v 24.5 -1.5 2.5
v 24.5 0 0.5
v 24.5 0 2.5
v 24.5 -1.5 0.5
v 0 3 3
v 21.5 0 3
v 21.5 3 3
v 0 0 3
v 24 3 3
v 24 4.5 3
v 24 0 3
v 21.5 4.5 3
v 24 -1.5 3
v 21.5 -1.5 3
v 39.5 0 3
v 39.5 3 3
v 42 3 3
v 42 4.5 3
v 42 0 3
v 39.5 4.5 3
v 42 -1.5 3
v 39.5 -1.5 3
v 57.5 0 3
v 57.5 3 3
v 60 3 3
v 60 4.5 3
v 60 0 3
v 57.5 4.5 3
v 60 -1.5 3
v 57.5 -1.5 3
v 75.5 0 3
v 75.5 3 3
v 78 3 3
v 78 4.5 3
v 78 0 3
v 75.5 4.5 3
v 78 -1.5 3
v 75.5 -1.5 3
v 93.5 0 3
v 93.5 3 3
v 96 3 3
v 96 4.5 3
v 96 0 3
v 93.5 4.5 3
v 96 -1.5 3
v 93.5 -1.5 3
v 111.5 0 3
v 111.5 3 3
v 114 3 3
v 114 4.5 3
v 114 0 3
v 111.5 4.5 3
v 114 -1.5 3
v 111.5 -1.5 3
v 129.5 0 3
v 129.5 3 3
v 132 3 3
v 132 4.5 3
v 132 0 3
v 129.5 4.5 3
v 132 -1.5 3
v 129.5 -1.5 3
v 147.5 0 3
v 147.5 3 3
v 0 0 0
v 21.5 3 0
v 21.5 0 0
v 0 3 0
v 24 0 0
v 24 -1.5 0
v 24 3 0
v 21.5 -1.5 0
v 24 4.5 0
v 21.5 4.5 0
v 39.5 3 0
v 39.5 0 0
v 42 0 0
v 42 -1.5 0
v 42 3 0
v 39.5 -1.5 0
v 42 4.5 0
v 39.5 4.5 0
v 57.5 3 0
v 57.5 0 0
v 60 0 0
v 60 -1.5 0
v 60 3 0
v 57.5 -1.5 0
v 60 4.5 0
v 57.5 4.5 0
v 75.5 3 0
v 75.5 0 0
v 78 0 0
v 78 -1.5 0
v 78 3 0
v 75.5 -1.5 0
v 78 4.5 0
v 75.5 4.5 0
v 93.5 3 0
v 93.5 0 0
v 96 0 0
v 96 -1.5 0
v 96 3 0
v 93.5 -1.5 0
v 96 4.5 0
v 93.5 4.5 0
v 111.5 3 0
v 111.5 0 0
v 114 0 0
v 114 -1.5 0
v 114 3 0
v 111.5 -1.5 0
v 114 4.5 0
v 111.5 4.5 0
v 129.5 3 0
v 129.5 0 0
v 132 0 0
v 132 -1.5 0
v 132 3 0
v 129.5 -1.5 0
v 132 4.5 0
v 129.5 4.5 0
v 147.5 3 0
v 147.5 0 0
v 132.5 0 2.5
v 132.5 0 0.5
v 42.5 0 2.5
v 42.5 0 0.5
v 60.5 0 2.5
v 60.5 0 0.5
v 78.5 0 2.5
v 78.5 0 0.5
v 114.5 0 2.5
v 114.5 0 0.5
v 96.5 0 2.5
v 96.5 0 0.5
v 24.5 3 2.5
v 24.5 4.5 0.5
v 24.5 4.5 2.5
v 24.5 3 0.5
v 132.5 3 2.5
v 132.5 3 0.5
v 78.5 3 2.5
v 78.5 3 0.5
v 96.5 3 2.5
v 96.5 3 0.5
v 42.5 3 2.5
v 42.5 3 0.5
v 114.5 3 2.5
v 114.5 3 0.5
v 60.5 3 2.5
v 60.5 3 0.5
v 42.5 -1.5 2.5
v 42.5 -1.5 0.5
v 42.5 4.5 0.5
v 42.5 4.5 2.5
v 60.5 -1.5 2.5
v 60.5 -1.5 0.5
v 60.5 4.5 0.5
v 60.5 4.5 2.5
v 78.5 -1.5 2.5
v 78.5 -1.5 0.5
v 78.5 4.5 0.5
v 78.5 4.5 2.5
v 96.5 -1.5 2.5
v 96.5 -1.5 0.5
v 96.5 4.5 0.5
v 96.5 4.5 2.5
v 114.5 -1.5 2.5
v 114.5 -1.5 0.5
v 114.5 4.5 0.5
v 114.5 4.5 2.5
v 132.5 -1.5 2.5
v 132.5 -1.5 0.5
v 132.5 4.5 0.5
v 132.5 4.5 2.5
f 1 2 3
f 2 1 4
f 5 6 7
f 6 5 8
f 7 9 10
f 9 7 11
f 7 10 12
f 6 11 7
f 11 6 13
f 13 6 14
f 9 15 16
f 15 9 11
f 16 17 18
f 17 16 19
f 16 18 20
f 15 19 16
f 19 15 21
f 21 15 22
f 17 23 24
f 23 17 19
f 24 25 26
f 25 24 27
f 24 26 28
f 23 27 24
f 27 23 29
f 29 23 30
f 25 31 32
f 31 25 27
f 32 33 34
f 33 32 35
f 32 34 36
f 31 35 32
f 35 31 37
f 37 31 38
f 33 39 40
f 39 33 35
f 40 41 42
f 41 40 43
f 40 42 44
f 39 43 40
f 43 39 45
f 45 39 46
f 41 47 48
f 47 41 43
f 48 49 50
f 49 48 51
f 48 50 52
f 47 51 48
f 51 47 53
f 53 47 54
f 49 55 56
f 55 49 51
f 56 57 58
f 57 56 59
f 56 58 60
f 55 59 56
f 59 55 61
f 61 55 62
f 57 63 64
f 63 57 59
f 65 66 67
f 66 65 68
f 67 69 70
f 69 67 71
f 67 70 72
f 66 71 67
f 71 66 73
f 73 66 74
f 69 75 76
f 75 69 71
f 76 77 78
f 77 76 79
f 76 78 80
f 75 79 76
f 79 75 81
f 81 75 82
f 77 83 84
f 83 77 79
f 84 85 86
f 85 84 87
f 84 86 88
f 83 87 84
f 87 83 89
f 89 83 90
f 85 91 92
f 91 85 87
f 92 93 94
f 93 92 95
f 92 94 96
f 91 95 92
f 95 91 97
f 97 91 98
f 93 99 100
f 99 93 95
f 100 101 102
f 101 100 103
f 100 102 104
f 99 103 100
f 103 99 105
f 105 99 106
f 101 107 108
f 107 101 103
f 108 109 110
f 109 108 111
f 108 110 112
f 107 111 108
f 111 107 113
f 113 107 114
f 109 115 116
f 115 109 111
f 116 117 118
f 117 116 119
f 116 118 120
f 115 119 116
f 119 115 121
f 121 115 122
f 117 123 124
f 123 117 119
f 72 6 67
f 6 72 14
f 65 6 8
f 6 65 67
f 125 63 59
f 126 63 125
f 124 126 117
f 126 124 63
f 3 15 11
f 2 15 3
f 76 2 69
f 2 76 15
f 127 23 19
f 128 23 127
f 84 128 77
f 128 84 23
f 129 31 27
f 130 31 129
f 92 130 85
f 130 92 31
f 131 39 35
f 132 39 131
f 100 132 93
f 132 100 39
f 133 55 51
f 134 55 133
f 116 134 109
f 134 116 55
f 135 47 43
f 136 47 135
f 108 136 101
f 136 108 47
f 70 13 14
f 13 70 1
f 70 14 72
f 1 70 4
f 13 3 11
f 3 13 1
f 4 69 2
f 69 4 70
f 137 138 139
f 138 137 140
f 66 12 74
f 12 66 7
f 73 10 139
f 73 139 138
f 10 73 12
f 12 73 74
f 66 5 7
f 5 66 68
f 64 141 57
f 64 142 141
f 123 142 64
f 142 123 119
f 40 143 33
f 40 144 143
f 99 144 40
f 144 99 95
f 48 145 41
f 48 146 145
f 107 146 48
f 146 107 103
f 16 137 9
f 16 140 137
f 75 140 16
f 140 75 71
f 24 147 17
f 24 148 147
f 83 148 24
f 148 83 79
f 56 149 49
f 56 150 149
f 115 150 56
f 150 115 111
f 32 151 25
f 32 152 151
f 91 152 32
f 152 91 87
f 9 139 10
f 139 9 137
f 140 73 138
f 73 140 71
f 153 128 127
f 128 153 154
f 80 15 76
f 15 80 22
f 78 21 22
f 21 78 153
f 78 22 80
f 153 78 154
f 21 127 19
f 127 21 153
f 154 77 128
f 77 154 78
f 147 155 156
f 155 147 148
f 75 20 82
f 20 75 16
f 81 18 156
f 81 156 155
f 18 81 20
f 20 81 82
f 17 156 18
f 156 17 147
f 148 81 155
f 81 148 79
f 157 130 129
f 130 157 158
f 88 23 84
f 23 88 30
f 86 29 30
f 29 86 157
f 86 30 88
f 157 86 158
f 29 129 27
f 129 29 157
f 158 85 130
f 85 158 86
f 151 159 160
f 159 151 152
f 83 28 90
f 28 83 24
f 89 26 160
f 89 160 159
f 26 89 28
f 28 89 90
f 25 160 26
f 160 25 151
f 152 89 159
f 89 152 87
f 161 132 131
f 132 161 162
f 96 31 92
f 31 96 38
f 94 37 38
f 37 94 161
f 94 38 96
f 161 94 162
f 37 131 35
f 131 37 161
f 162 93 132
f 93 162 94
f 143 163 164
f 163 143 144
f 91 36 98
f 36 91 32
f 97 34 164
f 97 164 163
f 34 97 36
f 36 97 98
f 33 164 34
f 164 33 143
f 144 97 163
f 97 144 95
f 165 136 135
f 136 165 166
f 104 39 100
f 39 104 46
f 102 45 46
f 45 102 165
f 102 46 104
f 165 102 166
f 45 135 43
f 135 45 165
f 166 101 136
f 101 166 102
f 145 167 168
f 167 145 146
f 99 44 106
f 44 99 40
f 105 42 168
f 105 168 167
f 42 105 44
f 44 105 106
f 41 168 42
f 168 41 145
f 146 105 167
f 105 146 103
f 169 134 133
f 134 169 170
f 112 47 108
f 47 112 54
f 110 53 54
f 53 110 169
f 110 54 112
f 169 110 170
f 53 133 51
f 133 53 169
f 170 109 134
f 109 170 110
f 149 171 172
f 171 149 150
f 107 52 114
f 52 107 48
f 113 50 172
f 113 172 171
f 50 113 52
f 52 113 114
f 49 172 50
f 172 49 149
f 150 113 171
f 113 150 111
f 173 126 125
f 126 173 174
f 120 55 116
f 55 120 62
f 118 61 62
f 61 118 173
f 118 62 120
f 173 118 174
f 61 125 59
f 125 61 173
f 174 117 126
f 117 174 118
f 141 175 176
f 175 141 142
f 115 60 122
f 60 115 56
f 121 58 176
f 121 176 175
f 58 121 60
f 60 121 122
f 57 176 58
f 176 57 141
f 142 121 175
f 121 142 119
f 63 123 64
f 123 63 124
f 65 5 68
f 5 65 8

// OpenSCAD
size = 7;
space = 15;
stick_size = 3;
hole_size = stick_size + 0.15;
gap_size = 5;

$fn=100;

module base(){
    difference(){
        cube([(space+hole_size)*size-space+hole_size*2, (space+hole_size)*size-space+hole_size*2, 10]);

        for (i=[0:size]){
            for (j=[0:size]){
                translate([i*(space+hole_size)+hole_size,j*(space+hole_size)+hole_size,2]) cube([hole_size,hole_size,10]);
            }
        }
    }
}

module stick() {
    cube([8+(space+stick_size)*(size+1)-stick_size*1.5,stick_size,stick_size]);
    for (i=[1:size]){
        translate([8+(space+stick_size)*i-stick_size*1.5,-stick_size/2,0])
        difference(){
            cube([stick_size,stick_size/2,stick_size]);
            
            translate([stick_size-0.5,-stick_size/2,stick_size])
            rotate([0,45,0])
            #cube([stick_size,stick_size,stick_size]);
            
            translate([stick_size-0.5,-stick_size/2,0])
            rotate([0,45,0])
            #cube([stick_size,stick_size,stick_size]);
            
        }
        
        translate([8+(space+stick_size)*i-stick_size*1.5,stick_size,0])
        difference(){
            cube([stick_size,stick_size/2,stick_size]);
            
            translate([stick_size-0.5,-0,stick_size])
            rotate([0,45,0])
            #cube([stick_size,stick_size,stick_size]);
            
            translate([stick_size-0.5,-0,0])
            rotate([0,45,0])
            #cube([stick_size,stick_size,stick_size]);
            
            
            
        }
    }
}

module ball() {
    difference(){
        diameter = space+stick_size-gap_size;
        sphere(d=diameter);
        
        translate([-diameter/2,-hole_size/2,-hole_size/2])
        cube([diameter, hole_size, diameter]);
        
        #translate([-diameter+hole_size/2,-hole_size,-hole_size/2])
        cube([diameter, hole_size*2, hole_size+0.1]);
        
        //
        translate([-diameter/2+1,0,1])
        rotate([0,45,0])
        cube([hole_size, hole_size*2, hole_size], center=true);
        
        
        
    }
}

stick();
//translate([8+space+stick_size*1.5,stick_size/2,stick_size/2]) ball();
//ball();
